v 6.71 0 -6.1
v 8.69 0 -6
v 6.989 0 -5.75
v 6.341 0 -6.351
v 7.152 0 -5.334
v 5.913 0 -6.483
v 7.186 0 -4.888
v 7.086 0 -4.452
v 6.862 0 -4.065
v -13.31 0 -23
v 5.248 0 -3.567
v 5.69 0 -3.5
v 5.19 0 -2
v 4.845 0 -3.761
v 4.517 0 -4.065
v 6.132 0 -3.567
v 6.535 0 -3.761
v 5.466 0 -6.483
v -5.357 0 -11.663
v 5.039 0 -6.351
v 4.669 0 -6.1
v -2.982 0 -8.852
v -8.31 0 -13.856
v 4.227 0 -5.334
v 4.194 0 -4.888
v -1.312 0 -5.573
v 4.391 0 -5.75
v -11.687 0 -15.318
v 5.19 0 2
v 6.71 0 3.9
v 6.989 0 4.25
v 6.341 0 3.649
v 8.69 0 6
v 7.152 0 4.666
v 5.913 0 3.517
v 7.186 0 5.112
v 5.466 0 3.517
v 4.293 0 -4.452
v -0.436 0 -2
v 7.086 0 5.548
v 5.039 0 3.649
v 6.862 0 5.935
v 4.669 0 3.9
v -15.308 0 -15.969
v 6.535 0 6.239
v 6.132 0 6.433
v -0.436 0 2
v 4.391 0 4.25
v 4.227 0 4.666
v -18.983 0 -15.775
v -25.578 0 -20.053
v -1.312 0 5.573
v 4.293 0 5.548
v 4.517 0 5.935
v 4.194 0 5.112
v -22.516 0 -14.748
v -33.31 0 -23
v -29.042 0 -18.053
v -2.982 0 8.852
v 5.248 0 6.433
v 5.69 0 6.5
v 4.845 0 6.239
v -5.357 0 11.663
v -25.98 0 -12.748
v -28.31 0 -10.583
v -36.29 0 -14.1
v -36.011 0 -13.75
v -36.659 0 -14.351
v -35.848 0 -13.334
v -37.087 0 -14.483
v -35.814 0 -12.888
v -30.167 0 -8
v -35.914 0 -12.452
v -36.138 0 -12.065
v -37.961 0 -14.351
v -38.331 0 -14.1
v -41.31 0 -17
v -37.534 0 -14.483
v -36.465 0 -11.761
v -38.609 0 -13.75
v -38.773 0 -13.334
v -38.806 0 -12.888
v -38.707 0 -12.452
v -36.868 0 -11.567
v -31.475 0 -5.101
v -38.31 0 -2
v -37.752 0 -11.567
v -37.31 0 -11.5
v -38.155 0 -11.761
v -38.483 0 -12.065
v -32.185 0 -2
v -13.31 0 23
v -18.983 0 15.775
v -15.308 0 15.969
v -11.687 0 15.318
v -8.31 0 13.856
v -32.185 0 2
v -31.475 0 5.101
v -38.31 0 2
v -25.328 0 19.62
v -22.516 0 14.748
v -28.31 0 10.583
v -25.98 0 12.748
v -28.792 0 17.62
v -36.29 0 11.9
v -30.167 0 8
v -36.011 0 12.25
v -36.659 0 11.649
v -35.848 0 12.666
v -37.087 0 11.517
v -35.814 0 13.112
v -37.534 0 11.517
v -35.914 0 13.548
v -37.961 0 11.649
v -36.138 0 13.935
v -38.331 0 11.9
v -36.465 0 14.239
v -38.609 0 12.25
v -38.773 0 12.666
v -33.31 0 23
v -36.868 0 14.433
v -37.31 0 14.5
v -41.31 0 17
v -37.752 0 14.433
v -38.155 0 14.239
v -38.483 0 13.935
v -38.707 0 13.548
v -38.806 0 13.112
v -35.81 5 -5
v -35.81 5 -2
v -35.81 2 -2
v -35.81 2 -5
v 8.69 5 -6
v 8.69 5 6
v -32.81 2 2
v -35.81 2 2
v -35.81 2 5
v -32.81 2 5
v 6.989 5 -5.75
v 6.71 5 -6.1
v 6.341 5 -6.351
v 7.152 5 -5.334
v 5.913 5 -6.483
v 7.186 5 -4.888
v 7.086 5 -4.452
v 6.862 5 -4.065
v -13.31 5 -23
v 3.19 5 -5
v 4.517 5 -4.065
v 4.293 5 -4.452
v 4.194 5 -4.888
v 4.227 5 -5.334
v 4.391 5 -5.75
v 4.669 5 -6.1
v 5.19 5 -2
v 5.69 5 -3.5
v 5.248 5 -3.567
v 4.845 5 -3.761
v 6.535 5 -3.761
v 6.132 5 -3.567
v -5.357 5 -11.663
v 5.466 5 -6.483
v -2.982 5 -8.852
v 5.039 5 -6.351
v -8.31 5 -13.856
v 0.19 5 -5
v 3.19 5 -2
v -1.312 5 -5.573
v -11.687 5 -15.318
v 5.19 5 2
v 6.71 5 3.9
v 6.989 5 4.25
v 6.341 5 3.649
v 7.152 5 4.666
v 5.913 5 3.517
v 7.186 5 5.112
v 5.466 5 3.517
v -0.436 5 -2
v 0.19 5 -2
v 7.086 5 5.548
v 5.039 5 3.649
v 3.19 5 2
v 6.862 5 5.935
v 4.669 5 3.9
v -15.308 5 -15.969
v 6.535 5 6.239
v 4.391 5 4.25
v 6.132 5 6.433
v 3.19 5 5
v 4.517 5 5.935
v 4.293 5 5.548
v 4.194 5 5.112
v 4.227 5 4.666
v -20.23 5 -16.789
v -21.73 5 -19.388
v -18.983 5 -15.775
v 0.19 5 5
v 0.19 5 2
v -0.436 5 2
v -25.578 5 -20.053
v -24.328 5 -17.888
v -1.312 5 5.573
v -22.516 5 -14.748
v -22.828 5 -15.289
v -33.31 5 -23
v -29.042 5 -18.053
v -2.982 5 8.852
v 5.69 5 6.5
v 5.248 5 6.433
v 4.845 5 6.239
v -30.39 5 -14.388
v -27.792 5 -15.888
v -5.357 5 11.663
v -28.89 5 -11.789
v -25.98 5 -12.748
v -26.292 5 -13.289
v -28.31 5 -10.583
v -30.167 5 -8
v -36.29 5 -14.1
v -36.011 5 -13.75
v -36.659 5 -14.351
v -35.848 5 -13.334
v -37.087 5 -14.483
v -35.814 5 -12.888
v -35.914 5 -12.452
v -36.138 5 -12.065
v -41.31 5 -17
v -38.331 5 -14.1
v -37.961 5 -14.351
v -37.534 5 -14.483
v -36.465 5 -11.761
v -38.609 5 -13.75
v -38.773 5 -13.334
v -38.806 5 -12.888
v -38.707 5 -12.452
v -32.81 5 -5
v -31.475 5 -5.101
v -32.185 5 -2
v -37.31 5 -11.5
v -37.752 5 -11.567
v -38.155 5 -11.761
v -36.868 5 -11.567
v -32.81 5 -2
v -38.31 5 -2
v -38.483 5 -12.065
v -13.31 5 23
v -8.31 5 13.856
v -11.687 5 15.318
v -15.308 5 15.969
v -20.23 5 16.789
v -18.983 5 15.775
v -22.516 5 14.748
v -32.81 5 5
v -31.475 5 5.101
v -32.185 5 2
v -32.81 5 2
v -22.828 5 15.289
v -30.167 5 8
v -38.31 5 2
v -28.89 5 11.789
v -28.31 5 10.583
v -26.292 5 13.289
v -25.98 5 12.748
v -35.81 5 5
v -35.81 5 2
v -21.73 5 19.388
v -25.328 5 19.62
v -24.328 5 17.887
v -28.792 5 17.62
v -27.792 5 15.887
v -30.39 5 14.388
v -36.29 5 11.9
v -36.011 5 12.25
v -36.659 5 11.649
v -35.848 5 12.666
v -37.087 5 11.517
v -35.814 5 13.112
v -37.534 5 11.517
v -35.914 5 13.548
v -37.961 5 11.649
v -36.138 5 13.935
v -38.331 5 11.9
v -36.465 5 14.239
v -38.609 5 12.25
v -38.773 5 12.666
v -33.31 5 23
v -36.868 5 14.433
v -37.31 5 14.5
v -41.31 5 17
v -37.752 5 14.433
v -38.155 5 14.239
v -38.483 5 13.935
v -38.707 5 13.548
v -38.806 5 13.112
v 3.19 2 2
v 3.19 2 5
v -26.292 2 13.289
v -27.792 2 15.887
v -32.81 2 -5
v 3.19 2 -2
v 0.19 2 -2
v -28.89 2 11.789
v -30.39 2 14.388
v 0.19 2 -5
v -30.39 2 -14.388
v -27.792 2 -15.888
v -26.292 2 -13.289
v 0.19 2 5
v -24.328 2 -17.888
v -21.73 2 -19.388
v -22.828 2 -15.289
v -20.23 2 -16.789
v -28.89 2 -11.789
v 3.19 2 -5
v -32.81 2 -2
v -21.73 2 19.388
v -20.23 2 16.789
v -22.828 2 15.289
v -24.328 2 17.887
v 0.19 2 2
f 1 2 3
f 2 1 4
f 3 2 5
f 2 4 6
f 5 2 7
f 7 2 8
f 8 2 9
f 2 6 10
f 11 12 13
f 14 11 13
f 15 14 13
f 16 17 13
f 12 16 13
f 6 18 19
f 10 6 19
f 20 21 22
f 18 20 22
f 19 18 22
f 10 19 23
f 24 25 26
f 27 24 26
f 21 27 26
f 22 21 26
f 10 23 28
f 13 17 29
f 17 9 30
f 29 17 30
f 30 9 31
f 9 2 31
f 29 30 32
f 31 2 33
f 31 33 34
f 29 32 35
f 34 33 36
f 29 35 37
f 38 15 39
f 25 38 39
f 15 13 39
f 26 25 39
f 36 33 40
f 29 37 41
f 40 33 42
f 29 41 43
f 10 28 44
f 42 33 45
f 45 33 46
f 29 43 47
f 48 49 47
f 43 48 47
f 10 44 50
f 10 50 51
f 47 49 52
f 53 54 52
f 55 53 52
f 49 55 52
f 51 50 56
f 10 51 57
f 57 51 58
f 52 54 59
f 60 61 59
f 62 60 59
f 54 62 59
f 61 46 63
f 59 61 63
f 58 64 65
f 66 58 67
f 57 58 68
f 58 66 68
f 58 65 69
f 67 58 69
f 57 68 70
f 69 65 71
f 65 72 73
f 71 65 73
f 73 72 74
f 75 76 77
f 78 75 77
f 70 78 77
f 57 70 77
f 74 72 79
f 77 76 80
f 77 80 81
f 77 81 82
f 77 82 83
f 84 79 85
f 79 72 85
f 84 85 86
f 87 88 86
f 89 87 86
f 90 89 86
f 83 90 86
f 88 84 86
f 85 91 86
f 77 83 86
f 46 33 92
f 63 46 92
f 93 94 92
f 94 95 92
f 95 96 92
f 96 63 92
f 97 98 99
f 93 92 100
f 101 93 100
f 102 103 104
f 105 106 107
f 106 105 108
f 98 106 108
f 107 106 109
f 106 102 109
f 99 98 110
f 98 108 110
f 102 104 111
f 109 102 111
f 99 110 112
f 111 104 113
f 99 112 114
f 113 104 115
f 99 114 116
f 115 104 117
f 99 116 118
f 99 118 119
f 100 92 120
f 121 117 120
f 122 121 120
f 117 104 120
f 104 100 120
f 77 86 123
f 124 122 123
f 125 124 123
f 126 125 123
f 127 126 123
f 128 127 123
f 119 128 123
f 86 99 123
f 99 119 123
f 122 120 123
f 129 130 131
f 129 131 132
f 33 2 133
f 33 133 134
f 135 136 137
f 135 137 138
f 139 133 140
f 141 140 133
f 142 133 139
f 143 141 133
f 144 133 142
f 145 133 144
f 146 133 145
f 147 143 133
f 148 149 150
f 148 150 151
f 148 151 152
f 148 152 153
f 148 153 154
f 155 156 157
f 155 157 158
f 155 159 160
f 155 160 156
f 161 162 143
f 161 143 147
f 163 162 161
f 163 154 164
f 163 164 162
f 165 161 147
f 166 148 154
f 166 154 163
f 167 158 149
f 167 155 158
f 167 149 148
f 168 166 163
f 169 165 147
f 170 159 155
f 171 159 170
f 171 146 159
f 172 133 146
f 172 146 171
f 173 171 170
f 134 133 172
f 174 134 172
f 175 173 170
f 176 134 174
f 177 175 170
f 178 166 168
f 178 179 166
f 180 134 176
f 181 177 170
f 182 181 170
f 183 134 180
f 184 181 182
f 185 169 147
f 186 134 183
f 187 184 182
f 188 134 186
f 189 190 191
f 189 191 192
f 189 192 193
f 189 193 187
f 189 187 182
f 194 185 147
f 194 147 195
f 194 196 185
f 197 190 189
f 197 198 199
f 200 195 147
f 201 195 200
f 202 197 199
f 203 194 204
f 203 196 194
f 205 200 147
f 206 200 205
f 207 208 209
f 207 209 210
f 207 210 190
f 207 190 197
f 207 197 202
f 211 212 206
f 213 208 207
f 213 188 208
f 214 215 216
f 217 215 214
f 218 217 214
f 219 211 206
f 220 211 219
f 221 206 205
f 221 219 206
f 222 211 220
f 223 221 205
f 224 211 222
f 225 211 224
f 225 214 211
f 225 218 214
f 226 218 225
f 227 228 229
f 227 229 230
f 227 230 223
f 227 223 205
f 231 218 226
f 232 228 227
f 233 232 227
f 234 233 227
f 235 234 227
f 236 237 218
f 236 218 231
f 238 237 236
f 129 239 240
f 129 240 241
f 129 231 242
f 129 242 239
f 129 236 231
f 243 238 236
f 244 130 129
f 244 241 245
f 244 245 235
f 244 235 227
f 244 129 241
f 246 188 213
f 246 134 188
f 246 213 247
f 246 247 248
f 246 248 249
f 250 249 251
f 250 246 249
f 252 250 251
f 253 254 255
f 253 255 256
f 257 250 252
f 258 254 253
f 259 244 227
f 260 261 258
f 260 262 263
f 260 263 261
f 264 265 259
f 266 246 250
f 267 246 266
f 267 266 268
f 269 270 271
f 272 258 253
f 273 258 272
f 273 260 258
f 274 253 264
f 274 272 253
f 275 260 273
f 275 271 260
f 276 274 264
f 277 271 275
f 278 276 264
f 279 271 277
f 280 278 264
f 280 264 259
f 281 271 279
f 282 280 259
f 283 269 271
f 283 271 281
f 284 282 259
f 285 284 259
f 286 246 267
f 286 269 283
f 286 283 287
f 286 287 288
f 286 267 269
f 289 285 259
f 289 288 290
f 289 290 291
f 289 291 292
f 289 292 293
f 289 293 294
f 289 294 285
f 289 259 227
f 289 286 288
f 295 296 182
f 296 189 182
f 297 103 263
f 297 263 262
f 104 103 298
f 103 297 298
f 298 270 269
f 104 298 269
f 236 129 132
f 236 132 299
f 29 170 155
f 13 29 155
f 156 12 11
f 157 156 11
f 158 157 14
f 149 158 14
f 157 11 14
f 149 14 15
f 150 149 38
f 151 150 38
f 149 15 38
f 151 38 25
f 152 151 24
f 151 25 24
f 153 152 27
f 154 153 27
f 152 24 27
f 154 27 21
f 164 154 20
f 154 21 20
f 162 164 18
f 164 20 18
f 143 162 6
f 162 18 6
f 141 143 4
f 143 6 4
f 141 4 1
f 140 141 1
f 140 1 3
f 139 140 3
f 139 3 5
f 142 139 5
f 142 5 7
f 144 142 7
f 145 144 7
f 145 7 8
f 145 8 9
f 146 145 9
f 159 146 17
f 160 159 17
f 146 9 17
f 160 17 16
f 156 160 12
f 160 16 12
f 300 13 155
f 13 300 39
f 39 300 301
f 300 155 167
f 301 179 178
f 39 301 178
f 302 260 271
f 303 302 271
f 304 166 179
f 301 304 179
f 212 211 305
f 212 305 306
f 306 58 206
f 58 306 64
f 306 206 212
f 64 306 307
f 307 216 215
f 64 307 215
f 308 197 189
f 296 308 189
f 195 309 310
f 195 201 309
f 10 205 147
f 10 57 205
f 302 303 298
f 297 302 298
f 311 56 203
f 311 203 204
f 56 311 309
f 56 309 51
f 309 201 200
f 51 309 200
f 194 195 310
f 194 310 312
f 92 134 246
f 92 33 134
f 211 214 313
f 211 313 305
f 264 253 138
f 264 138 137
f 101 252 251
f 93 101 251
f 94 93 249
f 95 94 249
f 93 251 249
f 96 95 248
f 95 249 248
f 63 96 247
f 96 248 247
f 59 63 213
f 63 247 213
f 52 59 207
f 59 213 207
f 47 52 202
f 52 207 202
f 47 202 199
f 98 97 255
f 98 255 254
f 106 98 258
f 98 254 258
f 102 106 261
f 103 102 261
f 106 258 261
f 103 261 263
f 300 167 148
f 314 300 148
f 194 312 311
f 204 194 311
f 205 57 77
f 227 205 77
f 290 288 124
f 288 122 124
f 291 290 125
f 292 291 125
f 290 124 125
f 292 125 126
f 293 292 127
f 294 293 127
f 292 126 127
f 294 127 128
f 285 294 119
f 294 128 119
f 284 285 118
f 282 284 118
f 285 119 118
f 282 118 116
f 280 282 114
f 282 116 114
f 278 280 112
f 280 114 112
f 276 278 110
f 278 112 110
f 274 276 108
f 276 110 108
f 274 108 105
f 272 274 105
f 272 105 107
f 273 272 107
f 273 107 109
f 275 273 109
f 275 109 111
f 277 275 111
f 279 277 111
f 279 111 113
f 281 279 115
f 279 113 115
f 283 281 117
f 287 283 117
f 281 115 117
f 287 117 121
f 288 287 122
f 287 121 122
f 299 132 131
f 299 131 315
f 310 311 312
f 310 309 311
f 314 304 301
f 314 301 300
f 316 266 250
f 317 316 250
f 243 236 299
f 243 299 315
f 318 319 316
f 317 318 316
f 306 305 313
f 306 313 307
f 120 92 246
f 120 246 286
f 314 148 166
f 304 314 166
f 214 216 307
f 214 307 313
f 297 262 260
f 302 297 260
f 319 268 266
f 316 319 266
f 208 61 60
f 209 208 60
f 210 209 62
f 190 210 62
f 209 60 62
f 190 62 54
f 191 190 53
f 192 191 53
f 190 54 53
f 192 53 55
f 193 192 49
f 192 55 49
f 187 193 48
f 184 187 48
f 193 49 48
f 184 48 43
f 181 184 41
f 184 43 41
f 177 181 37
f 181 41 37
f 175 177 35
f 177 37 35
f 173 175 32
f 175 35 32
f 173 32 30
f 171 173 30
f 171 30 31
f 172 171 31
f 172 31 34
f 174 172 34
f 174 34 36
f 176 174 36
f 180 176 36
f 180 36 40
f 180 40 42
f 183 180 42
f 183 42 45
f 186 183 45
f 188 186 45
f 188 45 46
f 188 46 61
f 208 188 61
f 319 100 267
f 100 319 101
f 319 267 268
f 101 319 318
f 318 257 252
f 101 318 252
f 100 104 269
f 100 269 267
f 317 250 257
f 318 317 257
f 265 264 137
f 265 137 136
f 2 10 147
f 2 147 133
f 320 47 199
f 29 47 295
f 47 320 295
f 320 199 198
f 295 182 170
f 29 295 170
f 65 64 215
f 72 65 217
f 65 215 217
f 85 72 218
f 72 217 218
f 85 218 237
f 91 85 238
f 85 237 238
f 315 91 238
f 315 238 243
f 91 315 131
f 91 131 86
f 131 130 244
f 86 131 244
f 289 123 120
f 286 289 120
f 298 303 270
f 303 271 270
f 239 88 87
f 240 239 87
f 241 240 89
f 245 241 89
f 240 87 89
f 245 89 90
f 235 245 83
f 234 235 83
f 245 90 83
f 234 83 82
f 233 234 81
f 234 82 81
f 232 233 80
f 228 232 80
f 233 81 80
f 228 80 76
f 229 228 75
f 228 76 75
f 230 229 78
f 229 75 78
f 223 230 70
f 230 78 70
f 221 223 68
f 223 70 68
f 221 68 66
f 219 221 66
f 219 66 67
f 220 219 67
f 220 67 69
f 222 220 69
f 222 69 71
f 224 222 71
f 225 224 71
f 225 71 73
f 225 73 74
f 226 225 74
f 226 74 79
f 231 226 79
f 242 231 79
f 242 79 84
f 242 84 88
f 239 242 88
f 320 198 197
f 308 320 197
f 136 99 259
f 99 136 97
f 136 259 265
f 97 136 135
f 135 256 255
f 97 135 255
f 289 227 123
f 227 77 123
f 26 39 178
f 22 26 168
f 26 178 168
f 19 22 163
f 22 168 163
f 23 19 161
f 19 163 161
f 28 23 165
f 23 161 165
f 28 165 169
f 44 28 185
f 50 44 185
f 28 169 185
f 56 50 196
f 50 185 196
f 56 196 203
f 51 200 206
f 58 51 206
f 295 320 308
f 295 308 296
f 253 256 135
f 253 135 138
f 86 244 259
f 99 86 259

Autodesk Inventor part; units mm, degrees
ref_plane "YZ Plane" through (0, 0, 0) normal (1, 0, 0) x (0, 1, 0)
ref_plane "XZ Plane" through (0, 0, 0) normal (0, 1, 0) x (-1, 0, 0)
ref_plane "XY Plane" through (0, 0, 0) normal (0, 0, 1) x (1, 0, 0)
sketch "スケッチ1" plane through (0, 0, 0) normal (0, 1, 0) x (-1, 0, 0)
  line L0 (33.3103, -23) -> (13.3103, -23)
  line L1 (13.3103, -23) -> (-8.6897, -6)
  line L2 (-8.6897, -6) -> (-8.6897, 6)
  line L3 (-8.6897, 6) -> (13.3103, 23)
  line L4 (13.3103, 23) -> (33.3103, 23)
  line L5 (-8.6897, -6) -> (33.3103, 23) construction
  line L6 (33.3103, -23) -> (-8.6897, 6) construction
  line L7 (33.3103, -23) -> (41.3103, -17)
  line L8 (41.3103, -17) -> (41.3103, 17)
  line L9 (41.3103, 17) -> (33.3103, 23)
  point P0 (0, 0)
  point P1 (0, 0)
  dimension "d1" = 46
  dimension "d50" = 20
  dimension "d51" = 20
  dimension "d52" = 17
  dimension "d53" = 17
  dimension "d72" = 8
  dimension "d73" = 6
  dimension "d74" = 6
  dimension "d75" = 50
extrude "押し出し5" add sketch "スケッチ1" along normal blind 5
ref_plane "作業平面2" through (0, 5, 0) normal (0, 1, 0) x (1, 0, 0)
sketch "スケッチ4" plane through (0, 5, 0) normal (0, 1, 0) x (1, 0, 0)
  line L0 (-16.3103, 0) -> (-25.3103, -15.5885)
  line L1 (-25.3103, -15.5885) -> (-16.3103, 0)
  line L2 (-25.3103, 15.5885) -> (-16.3103, 0)
  line L3 (-16.3103, 0) -> (1.6897, 0)
  line L4 (-20.2302, -16.7894) -> (-28.8905, -11.7894)
  line L5 (-28.8905, -11.7894) -> (-30.3905, -14.3875)
  line L6 (-30.3905, -14.3875) -> (-21.7302, -19.3875)
  line L7 (-21.7302, -19.3875) -> (-20.2302, -16.7894)
  line L8 (-20.2302, -16.7894) -> (-30.3905, -14.3875) construction
  line L9 (-28.8905, -11.7894) -> (-21.7302, -19.3875) construction
  line L10 (-20.2302, 16.7894) -> (-28.8905, 11.7894)
  line L11 (-28.8905, 11.7894) -> (-30.3905, 14.3875)
  line L12 (-30.3905, 14.3875) -> (-21.7302, 19.3875)
  line L13 (-21.7302, 19.3875) -> (-20.2302, 16.7894)
  line L14 (-20.2302, 16.7894) -> (-30.3905, 14.3875) construction
  line L15 (-28.8905, 11.7894) -> (-21.7302, 19.3875) construction
  line L16 (-25.2924, -11.5574) -> (-28.7924, -17.6195)
  line L17 (-28.7924, -17.6195) -> (-25.3283, -19.6195)
  line L18 (-25.3283, -19.6195) -> (-21.8283, -13.5574)
  line L19 (-21.8283, -13.5574) -> (-25.2924, -11.5574)
  line L20 (-25.2924, -11.5574) -> (-25.3283, -19.6195) construction
  line L21 (-28.7924, -17.6195) -> (-21.8283, -13.5574) construction
  line L22 (-29.0424, 18.0526) -> (-25.0424, 11.1244)
  line L23 (-25.0424, 11.1244) -> (-21.5783, 13.1244)
  line L24 (-21.5783, 13.1244) -> (-25.5783, 20.0526)
  line L25 (-25.5783, 20.0526) -> (-29.0424, 18.0526)
  line L26 (-29.0424, 18.0526) -> (-21.5783, 13.1244) construction
  line L27 (-25.0424, 11.1244) -> (-25.5783, 20.0526) construction
  line L28 (3.1897, -5) -> (3.1897, 5)
  line L29 (3.1897, 5) -> (0.1897, 5)
  line L30 (0.1897, 5) -> (0.1897, -5)
  line L31 (0.1897, -5) -> (3.1897, -5)
  line L32 (3.1897, -5) -> (0.1897, 5) construction
  line L33 (3.1897, 5) -> (0.1897, -5) construction
  line L34 (5.1897, 2) -> (-1.8103, 2)
  line L35 (-1.8103, 2) -> (-1.8103, -2)
  line L36 (-1.8103, -2) -> (5.1897, -2)
  line L37 (5.1897, -2) -> (5.1897, 2)
  line L38 (5.1897, 2) -> (-1.8103, -2) construction
  line L39 (-1.8103, 2) -> (5.1897, -2) construction
  circle A0 centre (-16.3103, 0) radius 16
  line L40 (-41.3103, 17) -> (-41.3103, -17) projected
  line L41 (-16.3103, 0) -> (-34.3103, 0)
  line L42 (-32.8103, -5) -> (-35.8103, -5)
  line L43 (-35.8103, -5) -> (-35.8103, 5)
  line L44 (-35.8103, 5) -> (-32.8103, 5)
  line L45 (-32.8103, 5) -> (-32.8103, -5)
  line L46 (-32.8103, -5) -> (-35.8103, 5) construction
  line L47 (-35.8103, -5) -> (-32.8103, 5) construction
  line L48 (-38.3103, -2) -> (-30.3103, -2)
  line L49 (-30.3103, -2) -> (-30.3103, 2)
  line L50 (-30.3103, 2) -> (-38.3103, 2)
  line L51 (-38.3103, 2) -> (-38.3103, -2)
  line L52 (-38.3103, -2) -> (-30.3103, 2) construction
  line L53 (-30.3103, -2) -> (-38.3103, 2) construction
  point P0 (-31.7241, 0)
  point P1 (-41.3103, 0)
  point P2 (-41.3103, 0)
  dimension "d8" = 120
  dimension "d9" = 120
  dimension "d10" = 18
  dimension "d11" = 18
  dimension "d12" = 18
  dimension "d13" = 4
  dimension "d14" = 4
  dimension "d15" = 4
  dimension "d16" = 7
  dimension "d17" = 3
  dimension "d18" = 10
  dimension "d19" = 8
  dimension "d20" = 10
  dimension "d21" = 3
  dimension "d22" = 10
  dimension "d23" = 3
  dimension "d24" = 7
  dimension "d29" = 32
  dimension "d79" = 25
  dimension "d121" = 18
  dimension "d122" = 4
  dimension "d123" = 8
  dimension "d124" = 3
  dimension "d125" = 10
extrude "押し出し2" cut sketch "スケッチ4" against normal blind 10 contours L19 L18 A0 L0 | L0 A0 L16 L19 | L23 L22 A0 L2 | L2 A0 L24 L23 | L35 L34 A0 L3 | L3 A0 L36 L35 | L49 L48 A0 L41 | L41 A0 L50 L49 | A0 L18 L4 L0 | L0 L4 L16 A0 | A0 L22 L10 L2 | L2 L10 L24 A0 | A0 L34 L30 L3 | L3 L30 L36 A0 | L41 L45 L50 A0 | A0 L48 L45 L41 | L4 L18 L6 L16 | L10 L22 L12 L24 | L30 L34 L28 L36 | L45 L48 L43 L50 | L18 L17 L16 L6 | L12 L22 L25 L24 | L34 L37 L36 L28 | L43 L48 L51 L50
extrude "押し出し3" cut sketch "スケッチ4" against normal blind 3 contours L4 L18 L6 L16 | L10 L22 L12 L24 | L30 L34 L28 L36 | L45 L48 L43 L50 | L4 L7 L6 L18 | L16 L6 L5 L4 | L24 L12 L13 L10 | L10 L11 L12 L22 | L30 L29 L28 L34 | L36 L28 L31 L30 | L50 L43 L44 L45 | L45 L42 L43 L48
extrude "押し出し4" cut sketch "スケッチ4" against normal blind 10 contours L3 L35 L36 A0 L18 L19 L0 | L41 L49 L50 A0 L22 L23 L2 | L2 L23 L24 A0 L34 L35 L3 | L0 L19 L16 A0 L48 L49 L41 | L19 L18 A0 L0 | L0 A0 L16 L19 | L23 L22 A0 L2 | L2 A0 L24 L23 | L35 L34 A0 L3 | L3 A0 L36 L35 | L49 L48 A0 L41 | L41 A0 L50 L49
ref_plane "作業平面1" through (0, 5, 0) normal (0, 1, 0) x (1, 0, 0)
sketch "スケッチ6" plane through (0, 5, 0) normal (0, 1, 0) x (1, 0, 0)
  line L0 (8.6897, -6) -> (8.6897, 6) projected
  line L1 (-33.3103, -23) -> (-13.3103, -23) projected
  line L2 (-13.3103, 23) -> (-33.3103, 23) projected
  point P0 (0, 0)
  point P1 (5.6897, 5)
  point P2 (5.6897, -5)
  point P3 (-37.3103, 13)
  point P4 (-37.3103, -13)
  dimension "d58" = 1
  dimension "d59" = 1
  dimension "d60" = 24
  dimension "d80" = 3
  dimension "d81" = 10
  dimension "d82" = 10
hole "穴2" at (5.6897, 5, -5) at (5.6897, 5, 5) at (-37.3103, 5, -13) at (-37.3103, 5, 13) direction (0, -1, 0) diameter 3 end through all
equation "\"d11\" = d10"
equation "\"d12\" = d10"
equation "\"d14\" = d13"
equation "\"d15\" = d13"
equation "\"d20\" = d18"
equation "\"d21\" = d17"
equation "\"d22\" = d18"
equation "\"d23\" = d17"
equation "\"d24\" = d16"
equation "\"d121\" = d11"
equation "\"d122\" = d14"
equation "\"d123\" = d19"
equation "\"d124\" = d21"
equation "\"d125\" = d20"
equation "\"d66\" = Thickness"
equation "\"BendRadius\" = Thickness"
equation "\"BendReliefWidth\" = Thickness"
equation "\"BendReliefDepth\" = 0.5 * Thickness"
equation "\"TransitionRadius\" = BendRadius"
equation "\"JacobiRadiusSize\" = Thickness"
equation "\"GapSize\" = Thickness"
equation "\"d2\" = Thickness"
equation "\"Thickness\" = 5"
properties part number "trackball-base" material "アルミニウム 6061"
